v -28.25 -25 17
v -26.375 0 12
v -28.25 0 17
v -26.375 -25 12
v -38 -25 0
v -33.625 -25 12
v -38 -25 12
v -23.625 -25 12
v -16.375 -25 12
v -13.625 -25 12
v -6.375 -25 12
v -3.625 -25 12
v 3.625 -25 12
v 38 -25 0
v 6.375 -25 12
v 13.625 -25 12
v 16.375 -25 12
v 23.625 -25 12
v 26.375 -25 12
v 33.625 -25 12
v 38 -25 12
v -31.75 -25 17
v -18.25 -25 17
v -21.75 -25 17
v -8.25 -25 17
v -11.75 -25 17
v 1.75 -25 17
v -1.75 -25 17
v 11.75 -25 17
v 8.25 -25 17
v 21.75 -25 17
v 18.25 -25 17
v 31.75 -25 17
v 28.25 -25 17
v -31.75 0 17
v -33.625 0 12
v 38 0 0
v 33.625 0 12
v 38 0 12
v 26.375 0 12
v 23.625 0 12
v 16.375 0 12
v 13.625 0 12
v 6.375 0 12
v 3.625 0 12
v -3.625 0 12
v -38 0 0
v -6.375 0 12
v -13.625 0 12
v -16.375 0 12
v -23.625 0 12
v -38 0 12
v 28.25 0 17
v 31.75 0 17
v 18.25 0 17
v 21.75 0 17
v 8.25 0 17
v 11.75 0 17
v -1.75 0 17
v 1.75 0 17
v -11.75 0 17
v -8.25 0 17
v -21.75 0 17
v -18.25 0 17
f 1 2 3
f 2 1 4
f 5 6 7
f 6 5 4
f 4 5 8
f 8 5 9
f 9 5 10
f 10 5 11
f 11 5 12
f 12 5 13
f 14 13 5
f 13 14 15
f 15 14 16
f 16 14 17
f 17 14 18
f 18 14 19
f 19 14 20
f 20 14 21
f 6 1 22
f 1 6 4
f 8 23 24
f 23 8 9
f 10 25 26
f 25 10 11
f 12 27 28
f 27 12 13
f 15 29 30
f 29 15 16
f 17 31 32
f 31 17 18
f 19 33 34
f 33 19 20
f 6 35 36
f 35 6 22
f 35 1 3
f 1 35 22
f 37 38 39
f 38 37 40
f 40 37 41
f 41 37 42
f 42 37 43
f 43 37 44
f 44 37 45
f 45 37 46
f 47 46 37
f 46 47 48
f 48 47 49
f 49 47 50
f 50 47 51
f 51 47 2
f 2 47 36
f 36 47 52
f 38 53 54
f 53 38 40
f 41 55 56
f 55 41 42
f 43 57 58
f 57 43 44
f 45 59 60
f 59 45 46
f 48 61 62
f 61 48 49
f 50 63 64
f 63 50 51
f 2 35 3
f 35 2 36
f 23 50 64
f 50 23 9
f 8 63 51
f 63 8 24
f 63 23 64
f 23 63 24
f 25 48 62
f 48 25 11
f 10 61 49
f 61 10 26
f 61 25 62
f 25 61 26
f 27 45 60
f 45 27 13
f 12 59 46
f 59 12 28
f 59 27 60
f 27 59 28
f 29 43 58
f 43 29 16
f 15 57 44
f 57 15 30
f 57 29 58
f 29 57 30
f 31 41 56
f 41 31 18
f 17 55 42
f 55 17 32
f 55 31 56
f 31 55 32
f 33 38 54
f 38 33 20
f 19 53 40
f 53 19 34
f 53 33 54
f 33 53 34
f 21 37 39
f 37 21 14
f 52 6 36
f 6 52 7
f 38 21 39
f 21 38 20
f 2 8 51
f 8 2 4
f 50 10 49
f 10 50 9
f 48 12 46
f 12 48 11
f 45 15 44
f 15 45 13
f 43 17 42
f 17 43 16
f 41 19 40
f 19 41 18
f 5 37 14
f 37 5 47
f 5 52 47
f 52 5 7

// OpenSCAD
$fn = 32;

// ----------------------------------------------------------------------
// Toothed rack, 7 teeth
// 10 mm pitch, 5 mm teeth
// ----------------------------------------------------------------------

// --- parameters (mm) ---
bar_w = 25;     // bar width (Y)
bar_h = 12;     // bar height (Z)
teeth = 7;      // number of teeth
pitch = 10;     // tooth pitch
tooth_h = 5;    // tooth height above the bar
root_w = 8;     // tooth width at the root
crest_w = 3.5;  // tooth width at the crest

// --- derived feature positions (mm) ---
span = (teeth - 1) * pitch;  // = 60   distance between the outer teeth
bar_l = span + root_w + 8;   // = 76   bar length: teeth plus 4 mm at each end
tooth_x = -span / 2;         // = -30   X of the first tooth
height = bar_h + tooth_h;    // = 17   overall height
feature_centers = [
  [tooth_x + 0 * pitch, -bar_w / 2],
  [tooth_x + 1 * pitch, -bar_w / 2],
  [tooth_x + 2 * pitch, -bar_w / 2],
  [tooth_x + 3 * pitch, -bar_w / 2],
  [tooth_x + 4 * pitch, -bar_w / 2],
  [tooth_x + 5 * pitch, -bar_w / 2],
  [tooth_x + 6 * pitch, -bar_w / 2]
];   // tooth centre line, drives the tooth loop

// bar with a rack of teeth, one extruded trapezoium per centre
module rack_tooth() {
  linear_extrude(height = bar_w)
    polygon(points = [
      [0, 0],
      [root_w, 0],
      [root_w / 2 + crest_w / 2, tooth_h + 1],
      [root_w / 2 - crest_w / 2, tooth_h + 1]
    ]);
}

union() {
  translate([-bar_l / 2, -bar_w, 0]) cube([bar_l, bar_w, bar_h]);
  for (centre = feature_centers)
    translate([centre[0] - root_w / 2, 0, bar_h - 1]) rotate([90, 0, 0]) rack_tooth();
}
